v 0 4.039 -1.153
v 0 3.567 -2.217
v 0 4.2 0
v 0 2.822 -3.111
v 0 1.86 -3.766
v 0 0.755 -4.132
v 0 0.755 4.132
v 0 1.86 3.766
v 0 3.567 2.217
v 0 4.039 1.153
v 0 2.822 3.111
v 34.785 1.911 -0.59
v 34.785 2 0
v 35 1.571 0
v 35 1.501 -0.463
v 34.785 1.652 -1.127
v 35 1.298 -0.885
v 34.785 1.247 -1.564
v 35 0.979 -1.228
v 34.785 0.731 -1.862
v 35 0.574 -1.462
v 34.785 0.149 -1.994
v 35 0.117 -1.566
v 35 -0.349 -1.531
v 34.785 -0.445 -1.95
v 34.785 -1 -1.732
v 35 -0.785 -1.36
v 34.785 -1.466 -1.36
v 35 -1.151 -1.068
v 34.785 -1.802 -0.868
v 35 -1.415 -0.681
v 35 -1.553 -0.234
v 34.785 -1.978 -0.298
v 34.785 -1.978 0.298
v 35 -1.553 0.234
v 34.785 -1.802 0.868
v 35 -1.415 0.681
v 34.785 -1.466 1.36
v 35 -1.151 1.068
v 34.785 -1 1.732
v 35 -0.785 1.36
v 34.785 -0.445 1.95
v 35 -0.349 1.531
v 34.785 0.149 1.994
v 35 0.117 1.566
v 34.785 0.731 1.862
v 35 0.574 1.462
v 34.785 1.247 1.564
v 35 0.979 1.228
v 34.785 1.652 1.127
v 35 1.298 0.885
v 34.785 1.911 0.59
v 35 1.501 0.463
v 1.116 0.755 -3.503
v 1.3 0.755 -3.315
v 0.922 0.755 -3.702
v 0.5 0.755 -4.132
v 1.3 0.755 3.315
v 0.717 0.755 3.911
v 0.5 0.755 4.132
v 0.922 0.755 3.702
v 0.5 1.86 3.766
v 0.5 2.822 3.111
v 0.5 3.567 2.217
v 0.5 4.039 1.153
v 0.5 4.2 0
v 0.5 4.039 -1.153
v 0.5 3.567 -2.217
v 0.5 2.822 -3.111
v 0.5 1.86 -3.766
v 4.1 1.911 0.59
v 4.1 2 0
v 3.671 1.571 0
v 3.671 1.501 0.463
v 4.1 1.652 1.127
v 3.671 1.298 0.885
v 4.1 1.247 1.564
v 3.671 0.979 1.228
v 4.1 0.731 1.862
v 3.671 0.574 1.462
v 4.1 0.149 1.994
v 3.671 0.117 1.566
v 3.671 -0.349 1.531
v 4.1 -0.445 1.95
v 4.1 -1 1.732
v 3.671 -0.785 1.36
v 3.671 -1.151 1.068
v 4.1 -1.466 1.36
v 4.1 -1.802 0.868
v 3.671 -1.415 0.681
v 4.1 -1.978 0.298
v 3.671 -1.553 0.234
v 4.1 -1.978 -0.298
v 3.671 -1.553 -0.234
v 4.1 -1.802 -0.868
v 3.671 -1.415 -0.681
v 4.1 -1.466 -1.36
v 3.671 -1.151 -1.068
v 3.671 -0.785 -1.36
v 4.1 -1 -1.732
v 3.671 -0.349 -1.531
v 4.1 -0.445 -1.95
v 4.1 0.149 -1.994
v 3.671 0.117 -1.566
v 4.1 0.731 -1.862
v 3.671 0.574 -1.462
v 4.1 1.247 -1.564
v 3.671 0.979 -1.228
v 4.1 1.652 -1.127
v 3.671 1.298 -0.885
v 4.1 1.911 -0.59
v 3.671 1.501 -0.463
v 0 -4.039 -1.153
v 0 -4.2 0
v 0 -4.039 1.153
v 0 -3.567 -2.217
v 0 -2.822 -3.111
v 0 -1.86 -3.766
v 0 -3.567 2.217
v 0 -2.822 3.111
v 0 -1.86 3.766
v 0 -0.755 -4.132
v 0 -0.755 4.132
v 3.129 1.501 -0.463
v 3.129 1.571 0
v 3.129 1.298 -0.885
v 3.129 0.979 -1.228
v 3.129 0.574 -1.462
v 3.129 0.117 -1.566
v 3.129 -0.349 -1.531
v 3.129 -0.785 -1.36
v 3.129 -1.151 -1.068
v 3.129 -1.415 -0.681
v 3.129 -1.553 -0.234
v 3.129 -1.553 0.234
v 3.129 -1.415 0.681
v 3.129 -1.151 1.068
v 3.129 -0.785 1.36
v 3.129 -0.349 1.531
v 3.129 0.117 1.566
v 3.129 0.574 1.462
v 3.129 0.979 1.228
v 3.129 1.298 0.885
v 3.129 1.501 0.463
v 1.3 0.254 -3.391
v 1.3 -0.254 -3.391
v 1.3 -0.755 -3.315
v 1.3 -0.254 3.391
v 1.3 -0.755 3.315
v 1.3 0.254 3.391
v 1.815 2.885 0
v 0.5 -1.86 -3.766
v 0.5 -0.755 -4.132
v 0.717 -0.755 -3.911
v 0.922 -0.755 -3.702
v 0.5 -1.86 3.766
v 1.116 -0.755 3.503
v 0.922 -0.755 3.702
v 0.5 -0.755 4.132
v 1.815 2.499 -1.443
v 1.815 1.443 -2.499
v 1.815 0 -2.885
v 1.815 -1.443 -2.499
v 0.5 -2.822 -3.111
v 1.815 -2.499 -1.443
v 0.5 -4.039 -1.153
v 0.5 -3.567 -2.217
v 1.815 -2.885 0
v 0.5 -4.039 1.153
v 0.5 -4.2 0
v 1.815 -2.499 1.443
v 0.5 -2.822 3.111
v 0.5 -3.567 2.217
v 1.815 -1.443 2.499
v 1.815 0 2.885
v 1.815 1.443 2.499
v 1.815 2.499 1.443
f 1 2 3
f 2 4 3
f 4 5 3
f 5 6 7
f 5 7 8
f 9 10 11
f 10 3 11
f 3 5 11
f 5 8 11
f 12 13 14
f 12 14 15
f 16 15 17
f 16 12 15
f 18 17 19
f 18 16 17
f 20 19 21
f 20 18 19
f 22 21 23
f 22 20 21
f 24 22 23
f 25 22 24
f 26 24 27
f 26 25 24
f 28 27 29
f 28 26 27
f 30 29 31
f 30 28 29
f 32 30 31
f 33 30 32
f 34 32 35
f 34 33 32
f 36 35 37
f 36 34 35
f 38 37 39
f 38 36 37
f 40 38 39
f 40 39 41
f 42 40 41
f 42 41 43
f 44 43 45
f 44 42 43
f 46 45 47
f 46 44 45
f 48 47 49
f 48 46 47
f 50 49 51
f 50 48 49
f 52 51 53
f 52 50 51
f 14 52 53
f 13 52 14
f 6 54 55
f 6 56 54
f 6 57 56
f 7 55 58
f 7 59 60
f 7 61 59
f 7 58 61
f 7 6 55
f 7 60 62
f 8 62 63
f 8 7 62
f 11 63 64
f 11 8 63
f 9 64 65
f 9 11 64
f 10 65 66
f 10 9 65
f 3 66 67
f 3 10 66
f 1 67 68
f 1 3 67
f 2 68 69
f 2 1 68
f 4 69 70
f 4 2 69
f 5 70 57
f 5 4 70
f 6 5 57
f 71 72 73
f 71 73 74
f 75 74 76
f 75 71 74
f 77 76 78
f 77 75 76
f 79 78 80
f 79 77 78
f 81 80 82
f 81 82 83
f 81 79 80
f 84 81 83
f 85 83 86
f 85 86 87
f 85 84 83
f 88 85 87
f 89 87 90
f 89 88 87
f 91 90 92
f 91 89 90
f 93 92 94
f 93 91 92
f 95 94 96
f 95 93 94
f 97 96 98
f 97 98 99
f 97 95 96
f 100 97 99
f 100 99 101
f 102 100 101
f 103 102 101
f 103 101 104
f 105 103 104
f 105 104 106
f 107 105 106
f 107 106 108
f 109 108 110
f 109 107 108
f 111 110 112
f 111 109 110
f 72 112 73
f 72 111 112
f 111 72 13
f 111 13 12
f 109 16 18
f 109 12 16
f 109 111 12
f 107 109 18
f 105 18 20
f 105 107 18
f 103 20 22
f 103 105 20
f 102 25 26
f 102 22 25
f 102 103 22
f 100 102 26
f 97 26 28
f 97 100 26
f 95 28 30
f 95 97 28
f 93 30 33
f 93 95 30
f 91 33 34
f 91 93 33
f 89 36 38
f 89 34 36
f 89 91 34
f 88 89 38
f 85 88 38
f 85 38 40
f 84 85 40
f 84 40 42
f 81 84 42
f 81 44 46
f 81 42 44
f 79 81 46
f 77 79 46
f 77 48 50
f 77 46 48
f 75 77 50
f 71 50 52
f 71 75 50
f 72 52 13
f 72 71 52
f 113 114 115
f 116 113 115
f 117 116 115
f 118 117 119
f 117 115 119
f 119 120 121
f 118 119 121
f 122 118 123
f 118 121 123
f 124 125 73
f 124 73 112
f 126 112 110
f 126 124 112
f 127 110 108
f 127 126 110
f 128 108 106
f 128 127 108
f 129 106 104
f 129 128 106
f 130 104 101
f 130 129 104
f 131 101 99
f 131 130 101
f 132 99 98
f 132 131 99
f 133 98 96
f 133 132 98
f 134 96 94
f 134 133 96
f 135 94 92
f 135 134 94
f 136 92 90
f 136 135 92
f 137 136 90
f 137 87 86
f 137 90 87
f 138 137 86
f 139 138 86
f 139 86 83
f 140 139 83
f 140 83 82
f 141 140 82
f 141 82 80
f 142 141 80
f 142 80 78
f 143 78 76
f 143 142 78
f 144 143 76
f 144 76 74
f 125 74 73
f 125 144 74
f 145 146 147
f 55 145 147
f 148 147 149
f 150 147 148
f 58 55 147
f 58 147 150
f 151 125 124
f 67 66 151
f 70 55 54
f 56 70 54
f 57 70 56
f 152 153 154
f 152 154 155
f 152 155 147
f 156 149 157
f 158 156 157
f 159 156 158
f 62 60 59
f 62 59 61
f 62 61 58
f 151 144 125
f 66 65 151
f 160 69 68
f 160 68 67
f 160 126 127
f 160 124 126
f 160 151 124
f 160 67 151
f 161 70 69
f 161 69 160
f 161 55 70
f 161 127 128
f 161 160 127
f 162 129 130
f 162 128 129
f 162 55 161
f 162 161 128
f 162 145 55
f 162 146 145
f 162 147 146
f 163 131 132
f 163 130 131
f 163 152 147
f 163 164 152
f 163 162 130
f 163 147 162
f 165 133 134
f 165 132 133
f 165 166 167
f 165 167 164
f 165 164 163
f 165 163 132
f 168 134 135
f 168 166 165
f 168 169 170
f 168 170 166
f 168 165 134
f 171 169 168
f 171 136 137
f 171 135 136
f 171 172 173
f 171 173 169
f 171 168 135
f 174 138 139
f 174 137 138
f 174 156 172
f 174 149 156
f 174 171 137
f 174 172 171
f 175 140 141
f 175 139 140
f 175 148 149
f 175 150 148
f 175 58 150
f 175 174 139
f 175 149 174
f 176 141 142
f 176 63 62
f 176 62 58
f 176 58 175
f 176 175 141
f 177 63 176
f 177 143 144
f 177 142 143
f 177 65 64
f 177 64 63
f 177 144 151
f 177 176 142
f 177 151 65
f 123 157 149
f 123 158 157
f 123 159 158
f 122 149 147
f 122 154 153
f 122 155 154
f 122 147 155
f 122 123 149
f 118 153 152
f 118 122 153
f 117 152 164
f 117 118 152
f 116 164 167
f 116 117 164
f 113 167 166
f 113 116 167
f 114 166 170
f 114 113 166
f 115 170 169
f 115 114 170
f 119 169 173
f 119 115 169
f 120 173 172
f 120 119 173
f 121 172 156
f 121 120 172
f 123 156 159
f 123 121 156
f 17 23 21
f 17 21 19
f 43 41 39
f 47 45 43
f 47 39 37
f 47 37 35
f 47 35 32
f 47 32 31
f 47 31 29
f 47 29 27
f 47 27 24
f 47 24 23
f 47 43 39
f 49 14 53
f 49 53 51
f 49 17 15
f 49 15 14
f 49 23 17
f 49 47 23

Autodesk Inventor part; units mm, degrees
ref_plane "YZ Plane" through (0, 0, 0) normal (1, 0, 0) x (0, 1, 0)
ref_plane "XZ Plane" through (0, 0, 0) normal (0, 1, 0) x (-1, 0, 0)
sketch "Szkic1" plane through (0, 0, 0) normal (0, 0, 1) x (1, 0, 0)
  line L0 (0, 0) -> (35, 0)
  line L1 (35, 0) -> (35, 2)
  line L2 (35, 2) -> (4.1, 2)
  line L3 (4.1, 2) -> (3.6706, 1.5706)
  line L4 (3.6706, 1.5706) -> (3.1294, 1.5706)
  line L5 (3.1294, 1.5706) -> (0.5, 4.2)
  line L6 (0.5, 4.2) -> (0, 4.2)
  line L7 (0, 4.2) -> (0, 0)
  line L8 (4.1, 2) -> (2.7, 2) construction
  line L9 (-7, 0) -> (42, 0) projected
  line L10 (0, 5.04) -> (0, -0.84) projected
  dimension "d0" = 35
  dimension "d1" = 45
  dimension "d2" = 0.4294
  dimension "d3" = 30.9
  dimension "d4" = 2.7
  dimension "d5" = 3.1412
  dimension "d6" = 4
  dimension "d7" = 8.4
revolve "Bryła" add sketch "Szkic1" angle 360 about axis through (0, 0, 0) along (1, 0, 0)
sketch "Szkic2" plane through (0, 0, 0) normal (-1, 0, 0) x (0, 0, 1)
  line L0 (4.2, -0.755) -> (-4.2, -0.755)
  line L1 (-4.2, -0.755) -> (-4.2, 0.755)
  line L2 (-4.2, 0.755) -> (4.2, 0.755)
  line L3 (4.2, 0.755) -> (4.2, -0.755)
  line L4 (0, 0.755) -> (0, -0.755) construction
  line L5 (-4.2, 0) -> (4.2, 0) construction
  line L6 (0, 4.2) -> (0, 0) projected
  dimension "d15" = 1.51
  dimension "d16" = 8.4
extrude "Szczelina" cut sketch "Szkic2" against normal blind 1.3
thread "Gwint" size "M4x0.7" class "6g" standard "ISO Metric profile" length 30.9
chamfer "Faza1" distance 0.4294 distance2 0.2147 1 edges at (35, -2, 0) measured on face at (35, 0.6473, -0.1595)
ref_plane "Work Plane1" through (33.575, 0, 0) normal (0, 0, -1) x (1, 0, 0)
equation "\"d0\" = NLG"
equation "\"d1\" = 0.5 * SEWI"
equation "\"d2\" = GAL"
equation "\"d3\" = GEL"
equation "\"d4\" = KOH"
equation "\"d5\" = BDM"
equation "\"d6\" = GD"
equation "\"d7\" = KOD"
equation "\"d15\" = SBR"
equation "\"d16\" = KOD"
equation "\"d8\" = STI"
equation "\"d10\" = GEL"
equation "\"d12\" = -0.5 * SPD + 0.5 * GD"
equation "\"d13\" = 0.5 * GAL"
equation "\"NLG\" = 35"
equation "\"GAL\" = 0.61345 * PTC"
equation "\"GEL\" = 30.9"
equation "\"KOH\" = 2.7"
equation "\"KOD\" = 8.4"
equation "\"SEWI\" = 90deg"
equation "\"BDM\" = NND - 1.2269 * PTC"
equation "\"GD\" = NND"
equation "\"SBR\" = 1.51"
equation "\"STI\" = 1.3"
equation "\"SPD\" = NND - 1.2269 * PTC"
equation "\"GUL\" = 0.61345 * PTC"
equation "\"PTC\" = 0.7"
equation "\"EPV\" = 4.7"
equation "\"THREADDIA\" = 4"
equation "\"TOA\" = 30deg"
equation "\"NND\" = 4"
equation "\"GD1\" = THREADDIA - 1.2269 * PTC"
properties part number "ISO 2009 - M4 x 35" material "Stal nierdzewna 440C"
